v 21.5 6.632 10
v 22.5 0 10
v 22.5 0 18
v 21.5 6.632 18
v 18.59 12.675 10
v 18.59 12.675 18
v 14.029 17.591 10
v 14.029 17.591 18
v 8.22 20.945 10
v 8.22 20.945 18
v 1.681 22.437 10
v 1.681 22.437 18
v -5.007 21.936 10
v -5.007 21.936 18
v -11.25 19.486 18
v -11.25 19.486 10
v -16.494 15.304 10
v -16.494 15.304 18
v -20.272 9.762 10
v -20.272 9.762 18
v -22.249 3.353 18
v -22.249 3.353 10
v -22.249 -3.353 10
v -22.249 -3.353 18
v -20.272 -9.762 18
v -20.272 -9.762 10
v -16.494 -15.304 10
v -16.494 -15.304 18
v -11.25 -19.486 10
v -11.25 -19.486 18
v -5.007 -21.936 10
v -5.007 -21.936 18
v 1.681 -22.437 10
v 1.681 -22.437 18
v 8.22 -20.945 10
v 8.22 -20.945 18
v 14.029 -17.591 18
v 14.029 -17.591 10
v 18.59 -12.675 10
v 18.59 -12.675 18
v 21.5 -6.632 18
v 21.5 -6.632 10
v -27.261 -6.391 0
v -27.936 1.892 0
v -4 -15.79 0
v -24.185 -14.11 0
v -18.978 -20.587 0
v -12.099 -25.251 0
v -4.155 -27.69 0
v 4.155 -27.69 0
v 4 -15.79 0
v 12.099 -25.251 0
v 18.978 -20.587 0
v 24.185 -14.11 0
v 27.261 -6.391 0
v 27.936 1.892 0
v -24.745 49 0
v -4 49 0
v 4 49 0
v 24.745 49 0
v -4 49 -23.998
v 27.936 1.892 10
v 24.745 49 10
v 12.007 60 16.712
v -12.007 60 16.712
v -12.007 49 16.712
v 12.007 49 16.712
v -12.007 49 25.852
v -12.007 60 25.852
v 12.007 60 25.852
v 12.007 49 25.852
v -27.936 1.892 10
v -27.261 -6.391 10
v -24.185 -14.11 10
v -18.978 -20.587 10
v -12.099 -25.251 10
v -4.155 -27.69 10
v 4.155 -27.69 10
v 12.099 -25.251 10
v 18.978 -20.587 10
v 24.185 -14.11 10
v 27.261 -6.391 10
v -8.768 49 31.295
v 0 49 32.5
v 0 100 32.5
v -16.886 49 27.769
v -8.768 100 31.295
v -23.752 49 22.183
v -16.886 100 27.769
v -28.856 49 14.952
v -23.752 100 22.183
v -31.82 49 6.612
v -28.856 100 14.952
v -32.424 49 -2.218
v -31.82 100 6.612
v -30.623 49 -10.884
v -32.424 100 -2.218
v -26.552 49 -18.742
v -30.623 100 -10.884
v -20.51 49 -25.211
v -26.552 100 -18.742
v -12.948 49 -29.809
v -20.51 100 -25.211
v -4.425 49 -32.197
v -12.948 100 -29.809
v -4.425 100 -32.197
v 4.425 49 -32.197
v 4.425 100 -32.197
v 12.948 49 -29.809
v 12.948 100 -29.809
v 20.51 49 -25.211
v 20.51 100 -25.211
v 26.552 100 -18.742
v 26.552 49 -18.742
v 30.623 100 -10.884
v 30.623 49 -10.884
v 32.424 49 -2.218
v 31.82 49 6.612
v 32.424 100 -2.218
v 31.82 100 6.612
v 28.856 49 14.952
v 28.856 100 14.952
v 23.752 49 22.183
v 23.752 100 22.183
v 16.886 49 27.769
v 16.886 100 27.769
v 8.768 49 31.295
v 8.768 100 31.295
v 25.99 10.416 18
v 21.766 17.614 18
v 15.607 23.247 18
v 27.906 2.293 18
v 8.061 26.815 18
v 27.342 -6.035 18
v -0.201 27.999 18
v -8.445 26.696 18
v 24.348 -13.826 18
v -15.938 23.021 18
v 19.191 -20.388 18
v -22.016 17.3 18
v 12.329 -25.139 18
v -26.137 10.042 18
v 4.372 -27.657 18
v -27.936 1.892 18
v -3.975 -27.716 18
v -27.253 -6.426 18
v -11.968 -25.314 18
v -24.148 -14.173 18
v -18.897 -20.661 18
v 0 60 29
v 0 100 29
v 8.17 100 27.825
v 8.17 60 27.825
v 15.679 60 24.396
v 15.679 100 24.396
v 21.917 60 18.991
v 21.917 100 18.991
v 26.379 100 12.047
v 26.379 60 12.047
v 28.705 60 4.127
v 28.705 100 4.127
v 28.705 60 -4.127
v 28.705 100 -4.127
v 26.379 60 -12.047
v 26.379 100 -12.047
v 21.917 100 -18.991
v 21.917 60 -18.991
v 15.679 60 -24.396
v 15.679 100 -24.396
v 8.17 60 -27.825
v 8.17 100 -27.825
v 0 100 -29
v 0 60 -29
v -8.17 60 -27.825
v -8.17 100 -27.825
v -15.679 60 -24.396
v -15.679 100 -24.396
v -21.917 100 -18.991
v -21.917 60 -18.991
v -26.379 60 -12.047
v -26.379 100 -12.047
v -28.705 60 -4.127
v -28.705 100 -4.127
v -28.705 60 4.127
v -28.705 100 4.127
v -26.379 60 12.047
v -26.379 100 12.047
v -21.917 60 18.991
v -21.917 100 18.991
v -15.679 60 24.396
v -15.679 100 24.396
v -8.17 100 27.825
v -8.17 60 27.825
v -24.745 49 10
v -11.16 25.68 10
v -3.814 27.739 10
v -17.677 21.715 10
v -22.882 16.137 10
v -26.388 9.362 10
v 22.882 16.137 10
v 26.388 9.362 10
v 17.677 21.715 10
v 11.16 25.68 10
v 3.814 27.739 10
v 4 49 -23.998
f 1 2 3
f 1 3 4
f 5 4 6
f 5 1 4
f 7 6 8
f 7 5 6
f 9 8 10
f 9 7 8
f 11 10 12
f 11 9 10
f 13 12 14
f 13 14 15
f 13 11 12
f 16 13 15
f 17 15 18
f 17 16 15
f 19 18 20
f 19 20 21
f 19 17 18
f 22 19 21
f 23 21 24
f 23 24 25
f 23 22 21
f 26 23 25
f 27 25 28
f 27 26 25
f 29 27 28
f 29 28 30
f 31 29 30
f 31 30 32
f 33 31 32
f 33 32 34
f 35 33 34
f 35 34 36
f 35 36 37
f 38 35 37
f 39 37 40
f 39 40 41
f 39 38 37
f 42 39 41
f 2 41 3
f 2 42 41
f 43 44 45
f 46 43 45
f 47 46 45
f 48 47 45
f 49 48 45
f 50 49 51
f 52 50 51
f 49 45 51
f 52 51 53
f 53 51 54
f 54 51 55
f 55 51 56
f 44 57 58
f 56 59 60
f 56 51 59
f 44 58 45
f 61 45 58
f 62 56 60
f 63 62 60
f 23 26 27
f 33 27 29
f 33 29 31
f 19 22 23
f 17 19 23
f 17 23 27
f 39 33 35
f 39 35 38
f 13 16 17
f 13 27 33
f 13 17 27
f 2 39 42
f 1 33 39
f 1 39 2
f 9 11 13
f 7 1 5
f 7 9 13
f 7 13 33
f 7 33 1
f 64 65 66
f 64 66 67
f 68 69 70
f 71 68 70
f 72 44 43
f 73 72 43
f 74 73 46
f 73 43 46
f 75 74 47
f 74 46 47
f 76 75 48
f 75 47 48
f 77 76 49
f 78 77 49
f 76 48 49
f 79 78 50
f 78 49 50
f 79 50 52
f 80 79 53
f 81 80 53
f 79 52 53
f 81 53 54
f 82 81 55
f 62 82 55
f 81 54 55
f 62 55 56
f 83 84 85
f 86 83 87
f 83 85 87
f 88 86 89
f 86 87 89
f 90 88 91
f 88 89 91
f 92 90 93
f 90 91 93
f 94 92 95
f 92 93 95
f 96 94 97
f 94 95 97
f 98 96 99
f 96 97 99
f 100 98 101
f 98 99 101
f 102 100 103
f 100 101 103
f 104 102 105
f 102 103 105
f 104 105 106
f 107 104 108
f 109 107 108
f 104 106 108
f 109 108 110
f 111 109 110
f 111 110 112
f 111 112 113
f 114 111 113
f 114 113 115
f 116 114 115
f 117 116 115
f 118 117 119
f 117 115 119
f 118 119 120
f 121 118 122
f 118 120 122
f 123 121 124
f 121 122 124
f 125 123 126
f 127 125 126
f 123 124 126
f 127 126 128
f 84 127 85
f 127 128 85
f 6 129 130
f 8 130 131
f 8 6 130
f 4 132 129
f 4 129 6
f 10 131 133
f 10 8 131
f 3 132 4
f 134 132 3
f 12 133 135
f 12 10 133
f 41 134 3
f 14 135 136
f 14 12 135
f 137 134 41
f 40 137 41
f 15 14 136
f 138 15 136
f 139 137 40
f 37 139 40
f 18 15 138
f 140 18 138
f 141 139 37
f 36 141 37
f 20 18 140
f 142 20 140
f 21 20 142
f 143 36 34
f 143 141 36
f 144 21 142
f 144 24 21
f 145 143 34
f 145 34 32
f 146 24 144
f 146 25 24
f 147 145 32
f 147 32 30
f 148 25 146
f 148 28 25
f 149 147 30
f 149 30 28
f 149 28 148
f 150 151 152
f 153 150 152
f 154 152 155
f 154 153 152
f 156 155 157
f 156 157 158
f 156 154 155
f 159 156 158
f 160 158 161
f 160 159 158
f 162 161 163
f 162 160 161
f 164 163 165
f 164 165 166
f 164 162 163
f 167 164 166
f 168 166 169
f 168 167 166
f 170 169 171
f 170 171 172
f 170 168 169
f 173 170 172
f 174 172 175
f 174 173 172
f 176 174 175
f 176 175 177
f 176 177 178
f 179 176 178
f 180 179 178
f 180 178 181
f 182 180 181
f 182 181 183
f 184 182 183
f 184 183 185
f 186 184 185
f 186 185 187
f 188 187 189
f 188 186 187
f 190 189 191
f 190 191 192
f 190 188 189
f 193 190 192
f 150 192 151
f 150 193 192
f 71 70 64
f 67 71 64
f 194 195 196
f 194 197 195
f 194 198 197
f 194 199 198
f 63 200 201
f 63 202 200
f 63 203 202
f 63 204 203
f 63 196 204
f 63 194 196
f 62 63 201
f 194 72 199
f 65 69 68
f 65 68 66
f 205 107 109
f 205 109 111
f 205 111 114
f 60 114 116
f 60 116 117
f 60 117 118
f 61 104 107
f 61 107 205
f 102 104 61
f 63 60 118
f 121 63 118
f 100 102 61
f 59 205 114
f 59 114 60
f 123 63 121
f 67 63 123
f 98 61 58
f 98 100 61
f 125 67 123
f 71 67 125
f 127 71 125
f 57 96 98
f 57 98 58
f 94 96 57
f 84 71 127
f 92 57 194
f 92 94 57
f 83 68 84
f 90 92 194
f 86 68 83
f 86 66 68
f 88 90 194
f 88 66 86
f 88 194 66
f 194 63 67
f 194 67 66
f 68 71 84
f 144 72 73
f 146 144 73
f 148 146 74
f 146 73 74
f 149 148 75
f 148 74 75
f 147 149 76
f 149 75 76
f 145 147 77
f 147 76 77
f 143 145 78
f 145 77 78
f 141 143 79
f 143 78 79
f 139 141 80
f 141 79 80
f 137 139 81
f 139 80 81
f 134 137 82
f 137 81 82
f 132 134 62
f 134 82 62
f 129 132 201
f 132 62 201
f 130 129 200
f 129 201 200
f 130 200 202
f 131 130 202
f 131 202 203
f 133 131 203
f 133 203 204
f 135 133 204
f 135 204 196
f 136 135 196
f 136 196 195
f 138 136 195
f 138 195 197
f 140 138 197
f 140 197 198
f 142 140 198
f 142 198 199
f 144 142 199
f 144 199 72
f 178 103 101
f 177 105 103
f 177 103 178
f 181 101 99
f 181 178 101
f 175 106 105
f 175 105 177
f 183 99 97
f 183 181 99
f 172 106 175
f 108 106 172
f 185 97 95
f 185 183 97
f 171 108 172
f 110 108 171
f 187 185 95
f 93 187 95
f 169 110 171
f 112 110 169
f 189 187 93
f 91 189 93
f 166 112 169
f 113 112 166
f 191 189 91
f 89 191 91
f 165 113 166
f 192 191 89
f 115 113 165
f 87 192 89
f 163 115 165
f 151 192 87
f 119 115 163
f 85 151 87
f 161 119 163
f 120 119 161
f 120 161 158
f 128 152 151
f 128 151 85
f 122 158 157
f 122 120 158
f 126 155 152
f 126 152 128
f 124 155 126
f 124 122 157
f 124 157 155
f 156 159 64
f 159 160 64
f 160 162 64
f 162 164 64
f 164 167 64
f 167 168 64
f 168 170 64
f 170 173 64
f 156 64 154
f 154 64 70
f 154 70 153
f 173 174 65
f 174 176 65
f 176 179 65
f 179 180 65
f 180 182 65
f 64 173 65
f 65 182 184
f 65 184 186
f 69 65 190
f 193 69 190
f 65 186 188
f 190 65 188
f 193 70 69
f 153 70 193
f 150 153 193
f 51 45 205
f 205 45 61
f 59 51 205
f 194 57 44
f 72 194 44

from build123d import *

# Parameters (mm, degrees)
EXTRUDE_1_DEPTH     = 10
SKETCH_2_R          = 28
SKETCH_2_R_2        = 22.5
EXTRUDE_2_DEPTH     = 8
SKETCH_3_R          = 32.5
SKETCH_3_R_2        = 29
EXTRUDE_3_DEPTH     = 40
SKETCH_4_R          = 32.5
EXTRUDE_4_DEPTH     = 11
RIB_4_REACH         = 112.057
SKETCH_5_WALL_W     = 291.205309728
SKETCH_5_WALL_H     = 8
SKETCH_6_W          = 24.014667972
SKETCH_6_H          = 9.139910945
CUT_EXTRUDE_1_DEPTH = 16


with BuildPart() as part:
    # 草图1 → 凸台-拉伸1 (new body)
    with BuildSketch(Plane.XY):
        with BuildLine():
            Line((0, 60), (-24, 60))
            Line((-24, 60), (-27.935985851, 1.892272326))
            ThreePointArc((-27.935985851, 1.892272326), (0, -28), (27.935985851, 1.892272326))
            Line((27.935985851, 1.892272326), (24, 60))
            Line((24, 60), (0, 60))
        make_face()
    extrude(amount=EXTRUDE_1_DEPTH)

    # 草图2 → 凸台-拉伸2 (add)
    with BuildSketch(Plane.XY.offset(10)):
        with Locations(Location((0, 0, 0), (0, 0, 176.124931535))):
            Circle(SKETCH_2_R)
        Circle(SKETCH_2_R_2, mode=Mode.SUBTRACT)
    extrude(amount=EXTRUDE_2_DEPTH)



with BuildPart() as body_2:
    # 草图3 → 凸台-拉伸3 (new body)
    with BuildSketch(Plane(origin=(0, 60, 0), x_dir=(1, 0, 0), z_dir=(0, 1, 0))):
        with Locations(Location((0, 0, 0), (0, 0, 270))):
            Circle(SKETCH_3_R)
        with Locations(Location((0, 0, 0), (0, 0, 270))):
            Circle(SKETCH_3_R_2, mode=Mode.SUBTRACT)
    extrude(amount=EXTRUDE_3_DEPTH)


with BuildPart() as part_1:
    add(part.part)

    add(body_2.part)  # 凸台-拉伸4 merges body 2
    # 草图4 → 凸台-拉伸4 (add)
    with BuildSketch(Plane.XZ.offset(-60)):
        with Locations(Location((0, 0, 0), (0, 0, 90))):
            Circle(SKETCH_4_R)
    extrude(amount=EXTRUDE_4_DEPTH)

    # 草图5 wall → 筋4 (add, up to next)
    with BuildSketch(Plane(origin=(0, 16.604964226, -11.999062573), x_dir=(0, 0.937740264285, -0.347337295346), z_dir=(0, 0.347337295346, 0.937740264285)), mode=Mode.PRIVATE) as rib_4_sk1:
        Rectangle(SKETCH_5_WALL_W, SKETCH_5_WALL_H)
    rib_4_tool1 = extrude(rib_4_sk1.sketch, amount=RIB_4_REACH, mode=Mode.PRIVATE) - part_1.part
    add(rib_4_tool1.solids().sort_by_distance((0, 16.604964226, -11.999062573))[0])

    # 草图6 → 切除-拉伸1 (cut)
    with BuildSketch(Plane(origin=(0, 60, 0), x_dir=(1, 0, 0), z_dir=(0, 1, 0))):
        with Locations((0, -21.281655386)):
            Rectangle(SKETCH_6_W, SKETCH_6_H)
    extrude(amount=-CUT_EXTRUDE_1_DEPTH, mode=Mode.SUBTRACT)


solid = part_1.part
